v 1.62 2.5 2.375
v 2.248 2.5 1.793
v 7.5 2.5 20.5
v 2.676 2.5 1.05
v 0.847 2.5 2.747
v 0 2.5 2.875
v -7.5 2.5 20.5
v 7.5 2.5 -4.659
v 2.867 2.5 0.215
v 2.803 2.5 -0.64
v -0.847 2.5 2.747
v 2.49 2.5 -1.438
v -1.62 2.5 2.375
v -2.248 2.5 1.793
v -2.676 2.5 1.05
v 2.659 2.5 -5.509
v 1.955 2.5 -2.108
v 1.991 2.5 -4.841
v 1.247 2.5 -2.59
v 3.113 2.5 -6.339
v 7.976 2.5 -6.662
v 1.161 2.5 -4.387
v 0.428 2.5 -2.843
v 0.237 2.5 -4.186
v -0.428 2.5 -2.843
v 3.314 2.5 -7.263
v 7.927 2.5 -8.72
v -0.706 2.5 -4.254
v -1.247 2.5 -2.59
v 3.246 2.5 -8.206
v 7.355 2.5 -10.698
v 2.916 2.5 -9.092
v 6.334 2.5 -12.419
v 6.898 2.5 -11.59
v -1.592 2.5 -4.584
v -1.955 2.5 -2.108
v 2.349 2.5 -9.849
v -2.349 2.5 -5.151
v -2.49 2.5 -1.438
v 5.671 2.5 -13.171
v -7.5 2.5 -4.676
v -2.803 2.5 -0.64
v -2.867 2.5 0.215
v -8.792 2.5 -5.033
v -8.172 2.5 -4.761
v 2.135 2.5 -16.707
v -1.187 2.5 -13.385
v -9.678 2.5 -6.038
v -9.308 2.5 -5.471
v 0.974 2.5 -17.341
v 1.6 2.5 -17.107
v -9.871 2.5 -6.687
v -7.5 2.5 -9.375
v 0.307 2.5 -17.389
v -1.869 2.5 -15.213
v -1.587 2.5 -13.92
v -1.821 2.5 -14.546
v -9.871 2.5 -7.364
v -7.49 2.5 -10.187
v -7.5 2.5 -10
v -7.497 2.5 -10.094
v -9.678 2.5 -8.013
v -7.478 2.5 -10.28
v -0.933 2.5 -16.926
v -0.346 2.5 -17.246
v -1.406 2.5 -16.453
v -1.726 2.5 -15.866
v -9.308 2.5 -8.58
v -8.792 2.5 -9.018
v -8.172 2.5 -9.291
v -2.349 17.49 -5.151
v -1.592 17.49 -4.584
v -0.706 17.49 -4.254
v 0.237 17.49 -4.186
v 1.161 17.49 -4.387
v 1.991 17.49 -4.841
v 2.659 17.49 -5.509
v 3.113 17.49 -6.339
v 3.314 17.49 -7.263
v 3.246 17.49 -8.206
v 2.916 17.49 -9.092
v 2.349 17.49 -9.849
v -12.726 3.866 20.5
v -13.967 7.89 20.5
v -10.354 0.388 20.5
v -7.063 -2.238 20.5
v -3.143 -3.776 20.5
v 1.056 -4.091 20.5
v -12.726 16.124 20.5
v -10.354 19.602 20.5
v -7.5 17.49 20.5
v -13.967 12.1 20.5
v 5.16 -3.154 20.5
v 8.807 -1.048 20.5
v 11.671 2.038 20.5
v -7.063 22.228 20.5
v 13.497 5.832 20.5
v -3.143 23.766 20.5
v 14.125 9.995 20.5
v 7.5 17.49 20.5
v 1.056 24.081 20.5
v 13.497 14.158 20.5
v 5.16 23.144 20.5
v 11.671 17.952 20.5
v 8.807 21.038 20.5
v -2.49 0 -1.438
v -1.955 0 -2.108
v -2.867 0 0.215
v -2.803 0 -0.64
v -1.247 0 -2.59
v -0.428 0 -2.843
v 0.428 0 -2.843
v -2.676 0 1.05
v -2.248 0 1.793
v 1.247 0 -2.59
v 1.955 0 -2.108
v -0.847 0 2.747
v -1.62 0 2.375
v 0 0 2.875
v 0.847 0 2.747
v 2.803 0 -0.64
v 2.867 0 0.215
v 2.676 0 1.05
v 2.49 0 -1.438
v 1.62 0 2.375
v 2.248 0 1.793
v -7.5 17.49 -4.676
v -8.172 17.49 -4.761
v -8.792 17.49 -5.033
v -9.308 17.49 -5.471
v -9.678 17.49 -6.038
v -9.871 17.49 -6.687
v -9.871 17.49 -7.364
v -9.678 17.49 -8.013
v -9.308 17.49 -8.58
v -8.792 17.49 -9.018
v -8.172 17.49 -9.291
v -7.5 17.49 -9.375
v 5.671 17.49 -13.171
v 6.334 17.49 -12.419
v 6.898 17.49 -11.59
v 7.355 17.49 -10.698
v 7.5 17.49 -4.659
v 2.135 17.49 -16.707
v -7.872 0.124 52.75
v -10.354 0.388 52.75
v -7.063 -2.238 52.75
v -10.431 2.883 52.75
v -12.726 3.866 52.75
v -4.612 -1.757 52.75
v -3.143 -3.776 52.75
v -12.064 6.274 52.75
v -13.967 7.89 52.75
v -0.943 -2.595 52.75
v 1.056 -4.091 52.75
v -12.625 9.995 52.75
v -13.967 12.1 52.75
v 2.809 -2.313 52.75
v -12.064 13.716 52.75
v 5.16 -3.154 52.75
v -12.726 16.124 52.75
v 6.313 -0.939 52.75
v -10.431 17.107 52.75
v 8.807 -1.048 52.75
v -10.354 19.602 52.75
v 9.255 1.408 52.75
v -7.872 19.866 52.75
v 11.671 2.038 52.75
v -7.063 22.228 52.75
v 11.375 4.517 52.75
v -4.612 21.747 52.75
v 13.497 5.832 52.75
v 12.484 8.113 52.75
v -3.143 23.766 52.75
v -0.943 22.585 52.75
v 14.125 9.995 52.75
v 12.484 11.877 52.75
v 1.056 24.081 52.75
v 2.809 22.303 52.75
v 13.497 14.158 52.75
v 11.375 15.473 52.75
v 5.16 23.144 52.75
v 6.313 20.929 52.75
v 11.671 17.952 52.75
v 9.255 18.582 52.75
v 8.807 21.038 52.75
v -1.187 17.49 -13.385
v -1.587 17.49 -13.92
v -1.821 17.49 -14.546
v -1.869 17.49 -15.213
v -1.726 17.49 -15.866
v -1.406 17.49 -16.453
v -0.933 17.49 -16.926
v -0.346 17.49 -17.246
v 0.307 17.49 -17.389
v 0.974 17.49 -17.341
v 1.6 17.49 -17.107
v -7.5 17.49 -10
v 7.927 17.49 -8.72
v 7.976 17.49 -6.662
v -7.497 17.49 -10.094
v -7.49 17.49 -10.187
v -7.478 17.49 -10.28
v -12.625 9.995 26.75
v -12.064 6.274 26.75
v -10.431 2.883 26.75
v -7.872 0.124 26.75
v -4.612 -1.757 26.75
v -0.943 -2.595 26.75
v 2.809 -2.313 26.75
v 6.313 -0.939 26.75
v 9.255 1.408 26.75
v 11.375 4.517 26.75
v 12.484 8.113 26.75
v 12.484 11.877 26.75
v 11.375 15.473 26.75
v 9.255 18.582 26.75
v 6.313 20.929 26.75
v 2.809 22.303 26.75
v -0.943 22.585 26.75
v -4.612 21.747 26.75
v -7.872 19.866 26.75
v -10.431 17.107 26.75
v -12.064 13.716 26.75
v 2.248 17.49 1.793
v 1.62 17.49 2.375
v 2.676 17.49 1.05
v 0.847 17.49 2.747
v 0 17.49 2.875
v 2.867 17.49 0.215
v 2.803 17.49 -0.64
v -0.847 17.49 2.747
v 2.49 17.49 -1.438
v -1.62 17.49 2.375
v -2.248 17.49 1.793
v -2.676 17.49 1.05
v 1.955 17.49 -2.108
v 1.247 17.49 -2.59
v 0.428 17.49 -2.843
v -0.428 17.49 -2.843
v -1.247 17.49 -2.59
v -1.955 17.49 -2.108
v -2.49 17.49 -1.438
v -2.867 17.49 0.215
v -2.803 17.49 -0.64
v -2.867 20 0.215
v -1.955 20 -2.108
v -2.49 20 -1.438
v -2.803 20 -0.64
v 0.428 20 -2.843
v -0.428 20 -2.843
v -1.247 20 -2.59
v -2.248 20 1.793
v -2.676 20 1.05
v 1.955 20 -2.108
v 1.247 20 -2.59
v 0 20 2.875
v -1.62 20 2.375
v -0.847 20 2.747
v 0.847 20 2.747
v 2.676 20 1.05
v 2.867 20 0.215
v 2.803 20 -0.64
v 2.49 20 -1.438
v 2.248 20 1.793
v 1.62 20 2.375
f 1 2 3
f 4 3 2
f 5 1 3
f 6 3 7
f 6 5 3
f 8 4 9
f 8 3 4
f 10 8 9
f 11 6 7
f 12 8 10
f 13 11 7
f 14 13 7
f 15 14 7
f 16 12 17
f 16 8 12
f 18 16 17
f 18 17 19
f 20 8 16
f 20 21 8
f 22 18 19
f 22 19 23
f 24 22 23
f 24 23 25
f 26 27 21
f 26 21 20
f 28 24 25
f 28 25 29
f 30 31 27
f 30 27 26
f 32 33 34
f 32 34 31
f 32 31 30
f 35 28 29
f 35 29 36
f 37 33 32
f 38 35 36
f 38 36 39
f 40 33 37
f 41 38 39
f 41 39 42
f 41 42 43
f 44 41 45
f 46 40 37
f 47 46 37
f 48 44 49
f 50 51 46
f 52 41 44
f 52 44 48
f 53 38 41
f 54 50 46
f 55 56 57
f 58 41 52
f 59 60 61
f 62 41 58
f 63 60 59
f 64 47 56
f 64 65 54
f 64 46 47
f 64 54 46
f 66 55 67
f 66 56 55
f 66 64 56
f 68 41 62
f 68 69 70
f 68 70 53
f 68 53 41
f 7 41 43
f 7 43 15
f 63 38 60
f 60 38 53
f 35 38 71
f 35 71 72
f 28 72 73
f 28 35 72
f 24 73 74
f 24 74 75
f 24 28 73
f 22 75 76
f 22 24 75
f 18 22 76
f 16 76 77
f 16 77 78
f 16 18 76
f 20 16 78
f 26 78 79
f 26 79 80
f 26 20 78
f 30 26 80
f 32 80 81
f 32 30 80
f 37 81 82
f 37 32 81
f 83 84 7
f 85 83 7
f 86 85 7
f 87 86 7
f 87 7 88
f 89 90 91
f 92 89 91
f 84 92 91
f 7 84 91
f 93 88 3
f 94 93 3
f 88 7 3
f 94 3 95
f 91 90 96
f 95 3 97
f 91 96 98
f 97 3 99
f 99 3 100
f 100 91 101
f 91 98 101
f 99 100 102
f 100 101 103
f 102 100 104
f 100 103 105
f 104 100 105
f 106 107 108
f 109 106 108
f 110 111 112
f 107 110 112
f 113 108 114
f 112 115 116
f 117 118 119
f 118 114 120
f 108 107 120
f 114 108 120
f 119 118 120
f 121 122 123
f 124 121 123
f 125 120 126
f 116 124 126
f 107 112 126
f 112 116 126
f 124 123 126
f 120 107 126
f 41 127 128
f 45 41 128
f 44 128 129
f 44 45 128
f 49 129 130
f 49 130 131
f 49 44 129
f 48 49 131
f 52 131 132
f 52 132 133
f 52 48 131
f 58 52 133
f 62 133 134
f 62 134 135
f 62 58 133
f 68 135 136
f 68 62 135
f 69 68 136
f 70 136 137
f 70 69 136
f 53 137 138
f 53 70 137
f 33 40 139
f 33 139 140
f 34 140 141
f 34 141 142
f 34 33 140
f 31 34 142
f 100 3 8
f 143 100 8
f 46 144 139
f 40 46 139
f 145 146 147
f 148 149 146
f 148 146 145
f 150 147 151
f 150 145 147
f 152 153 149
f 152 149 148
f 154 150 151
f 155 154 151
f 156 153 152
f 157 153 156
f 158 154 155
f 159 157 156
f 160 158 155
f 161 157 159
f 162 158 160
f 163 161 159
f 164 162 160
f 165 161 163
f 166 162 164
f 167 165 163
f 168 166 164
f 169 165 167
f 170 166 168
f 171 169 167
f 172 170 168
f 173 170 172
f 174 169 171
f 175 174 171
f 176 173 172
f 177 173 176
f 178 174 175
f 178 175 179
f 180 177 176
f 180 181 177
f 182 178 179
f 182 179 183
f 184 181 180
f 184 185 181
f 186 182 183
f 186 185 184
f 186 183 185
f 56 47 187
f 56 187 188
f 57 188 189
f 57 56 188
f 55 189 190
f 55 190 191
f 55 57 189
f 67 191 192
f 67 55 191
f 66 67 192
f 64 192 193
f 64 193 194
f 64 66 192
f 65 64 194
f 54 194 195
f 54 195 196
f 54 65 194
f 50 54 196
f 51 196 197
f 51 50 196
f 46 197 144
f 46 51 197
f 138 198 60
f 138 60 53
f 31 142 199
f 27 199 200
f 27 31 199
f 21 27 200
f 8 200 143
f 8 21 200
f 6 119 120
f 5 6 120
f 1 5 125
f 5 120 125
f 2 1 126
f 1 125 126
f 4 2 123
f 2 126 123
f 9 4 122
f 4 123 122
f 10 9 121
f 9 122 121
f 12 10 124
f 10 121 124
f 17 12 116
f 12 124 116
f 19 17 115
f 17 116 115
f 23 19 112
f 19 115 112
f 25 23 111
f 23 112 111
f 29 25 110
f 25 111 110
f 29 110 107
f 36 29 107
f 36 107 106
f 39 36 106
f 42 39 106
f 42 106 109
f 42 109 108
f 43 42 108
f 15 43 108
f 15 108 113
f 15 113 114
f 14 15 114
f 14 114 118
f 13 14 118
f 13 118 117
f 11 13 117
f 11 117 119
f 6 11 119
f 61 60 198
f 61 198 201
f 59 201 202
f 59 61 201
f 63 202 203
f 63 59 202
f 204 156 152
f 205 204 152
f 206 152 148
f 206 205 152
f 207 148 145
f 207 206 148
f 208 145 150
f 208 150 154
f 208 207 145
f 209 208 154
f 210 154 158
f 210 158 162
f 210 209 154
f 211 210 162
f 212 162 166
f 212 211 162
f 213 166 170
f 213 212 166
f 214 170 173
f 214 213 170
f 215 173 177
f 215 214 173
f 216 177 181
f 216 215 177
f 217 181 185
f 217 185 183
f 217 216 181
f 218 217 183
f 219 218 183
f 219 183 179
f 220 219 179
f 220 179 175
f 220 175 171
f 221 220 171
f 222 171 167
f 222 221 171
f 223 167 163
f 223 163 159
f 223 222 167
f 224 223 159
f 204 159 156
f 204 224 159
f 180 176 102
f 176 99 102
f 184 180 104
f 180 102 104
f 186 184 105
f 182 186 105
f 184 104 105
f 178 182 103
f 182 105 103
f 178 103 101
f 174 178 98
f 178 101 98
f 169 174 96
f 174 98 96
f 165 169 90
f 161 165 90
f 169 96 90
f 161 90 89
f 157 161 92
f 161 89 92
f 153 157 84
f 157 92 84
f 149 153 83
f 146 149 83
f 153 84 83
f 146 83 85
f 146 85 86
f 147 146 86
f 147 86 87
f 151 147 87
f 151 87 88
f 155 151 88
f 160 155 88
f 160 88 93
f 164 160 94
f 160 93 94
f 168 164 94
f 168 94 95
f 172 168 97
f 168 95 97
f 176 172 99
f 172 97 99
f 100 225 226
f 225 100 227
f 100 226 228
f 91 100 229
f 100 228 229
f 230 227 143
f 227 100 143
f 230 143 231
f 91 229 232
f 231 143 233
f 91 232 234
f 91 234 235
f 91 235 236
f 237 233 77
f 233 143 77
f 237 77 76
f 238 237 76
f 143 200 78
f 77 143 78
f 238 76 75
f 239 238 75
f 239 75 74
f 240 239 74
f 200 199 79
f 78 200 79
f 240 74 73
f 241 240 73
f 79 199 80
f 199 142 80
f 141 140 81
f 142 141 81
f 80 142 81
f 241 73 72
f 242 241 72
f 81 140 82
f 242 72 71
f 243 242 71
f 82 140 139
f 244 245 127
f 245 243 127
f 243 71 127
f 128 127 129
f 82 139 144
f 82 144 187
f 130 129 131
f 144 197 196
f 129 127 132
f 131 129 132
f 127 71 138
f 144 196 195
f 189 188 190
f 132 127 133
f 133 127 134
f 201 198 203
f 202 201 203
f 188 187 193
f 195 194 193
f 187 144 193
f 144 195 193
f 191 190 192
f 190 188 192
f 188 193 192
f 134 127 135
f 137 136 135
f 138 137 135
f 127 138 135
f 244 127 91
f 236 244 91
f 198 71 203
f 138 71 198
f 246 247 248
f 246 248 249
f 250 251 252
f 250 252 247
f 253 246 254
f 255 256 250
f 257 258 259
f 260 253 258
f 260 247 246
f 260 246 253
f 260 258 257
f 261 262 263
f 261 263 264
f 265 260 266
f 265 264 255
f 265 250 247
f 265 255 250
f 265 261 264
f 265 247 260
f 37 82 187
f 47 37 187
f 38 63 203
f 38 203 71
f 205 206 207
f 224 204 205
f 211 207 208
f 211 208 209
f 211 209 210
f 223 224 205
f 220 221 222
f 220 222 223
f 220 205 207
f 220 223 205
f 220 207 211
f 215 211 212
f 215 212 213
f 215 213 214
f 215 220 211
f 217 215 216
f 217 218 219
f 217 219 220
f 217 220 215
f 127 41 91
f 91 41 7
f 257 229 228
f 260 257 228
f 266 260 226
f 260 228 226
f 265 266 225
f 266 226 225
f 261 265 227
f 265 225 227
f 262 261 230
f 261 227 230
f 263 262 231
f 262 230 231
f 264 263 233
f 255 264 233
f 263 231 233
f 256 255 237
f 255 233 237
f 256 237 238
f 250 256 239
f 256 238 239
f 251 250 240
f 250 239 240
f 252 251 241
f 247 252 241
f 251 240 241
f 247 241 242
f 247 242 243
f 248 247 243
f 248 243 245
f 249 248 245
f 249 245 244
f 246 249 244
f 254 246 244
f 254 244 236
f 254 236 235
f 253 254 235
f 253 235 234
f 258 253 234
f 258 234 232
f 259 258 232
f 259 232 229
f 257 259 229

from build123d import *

# Parameters (mm, degrees)
SKETCH1_R           = 2.875
BOSS_EXTRUDE1_DEPTH = 20
SKETCH2_R           = 2.875
BOSS_EXTRUDE2_DEPTH = 14.99
BOSS_EXTRUDE3_DEPTH = 14.99
SKETCH4_R           = 14.125
SKETCH4_W           = 15
SKETCH4_H           = 14.99
SKETCH4_H_2         = 7.495
BOSS_EXTRUDE4_DEPTH = 6.25
SKETCH5_R           = 14.125
SKETCH5_R_2         = 12.625
BOSS_EXTRUDE5_DEPTH = 26
BOSS_EXTRUDE8_DEPTH = 14.99
CUT_EXTRUDE3_DEPTH  = 59.732465681


with BuildPart() as part:
    # Sketch1 → Boss-Extrude1 (new body)
    with BuildSketch(Plane(origin=(0, 0, 0), x_dir=(1, 0, 0), z_dir=(0, 1, 0))):
        with Locations(Location((0, 0, 0), (0, 0, 270))):
            Circle(SKETCH1_R)
    extrude(amount=BOSS_EXTRUDE1_DEPTH)

    # Sketch2 → Boss-Extrude2 (add)
    with BuildSketch(Plane(origin=(0, 2.5, 0), x_dir=(-1, 0, 0), z_dir=(0, -1, 0))):
        with BuildLine():
            Line((-4, 7.5), (-4, 10))
            ThreePointArc((-4, 10), (-5.75, 11.75), (-7.5, 10))
            Line((-7.5, 10), (-7.5, 0))
            ThreePointArc((-7.5, 0), (0, -7.5), (7.5, 0))
            Line((7.5, 0), (7.5, 10))
            ThreePointArc((7.5, 10), (5.75, 11.75), (4, 10))
            Line((4, 10), (4, 7.5))
            ThreePointArc((4, 7.5), (0, 3.5), (-4, 7.5))
        make_face()
        with Locations(Location((0, 0, 0), (0, 0, 90))):
            Circle(SKETCH2_R, mode=Mode.SUBTRACT)
    extrude(amount=-BOSS_EXTRUDE2_DEPTH)

    # Sketch3 → Boss-Extrude3 (add)
    with BuildSketch(Plane(origin=(0, 2.5, 0), x_dir=(-1, 0, 0), z_dir=(0, -1, 0))):
        with BuildLine():
            Line((7.5, 0), (7.5, -20.5))
            Line((7.5, -20.5), (-7.5, -20.5))
            Line((-7.5, -20.5), (-7.5, 0))
            ThreePointArc((-7.5, 0), (0, -7.5), (7.5, 0))
        make_face()
    extrude(amount=-BOSS_EXTRUDE3_DEPTH)

    # Sketch4 → Boss-Extrude4 (add)
    # profile 1 of 3: a face of its own
    with BuildSketch(Plane.XY.offset(20.5)):
        with Locations((0, 9.995)):
            Circle(SKETCH4_R)
        with Locations((0, 9.995)):
            Rectangle(SKETCH4_W, SKETCH4_H, mode=Mode.SUBTRACT)
    # profile 2 of 3: a face of its own
    with BuildSketch(Plane.XY.offset(20.5)):
        with Locations((0, 13.7425)):
            Rectangle(SKETCH4_W, SKETCH4_H_2)
    # profile 3 of 3: a face of its own
    with BuildSketch(Plane.XY.offset(20.5)):
        with Locations((0, 6.2475)):
            Rectangle(SKETCH4_W, SKETCH4_H_2)
    extrude(amount=BOSS_EXTRUDE4_DEPTH)

    # Sketch5 → Boss-Extrude5 (add)
    with BuildSketch(Plane.XY.offset(26.75)):
        with Locations((0, 9.995)):
            Circle(SKETCH5_R)
        with Locations(Location((0, 9.995, 0), (0, 0, 180))):
            Circle(SKETCH5_R_2, mode=Mode.SUBTRACT)
    extrude(amount=BOSS_EXTRUDE5_DEPTH)

    # Sketch6 → Boss-Extrude8 (add)
    with BuildSketch(Plane(origin=(0, 2.5, 0), x_dir=(-1, 0, 0), z_dir=(0, -1, 0))):
        with BuildLine():
            Line((-2.135439924, 16.706507736), (-5.67097383, 13.17097383))
            ThreePointArc((-5.67097383, 13.17097383), (-6.629279887, 12.013594636), (-7.354872555, 10.697770796))
            ThreePointArc((-7.354872555, 10.697770796), (-5.393648327, 11.713334026), (-4, 10))
            Line((-4, 10), (-4, 7.5))
            ThreePointArc((-4, 7.5), (-0.388580969, 3.518919138), (3.924502415, 6.726513871))
            Line((3.924502415, 6.726513871), (2.348994272, 5.151005728))
            ThreePointArc((2.348994272, 5.151005728), (-2.348994272, 5.151005728), (-2.348994272, 9.848994272))
            Line((-2.348994272, 9.848994272), (1.186539634, 13.384528178))
            ThreePointArc((1.186539634, 13.384528178), (1.186539634, 16.706507736), (-2.135439924, 16.706507736))
        make_face()
        with BuildLine():
            ThreePointArc((-7.5, 10), (-7.463334026, 10.356351673), (-7.354872555, 10.697770796))
            ThreePointArc((-7.354872555, 10.697770796), (-8.017652884, 7.692692975), (-7.5, 4.659245108))
            Line((-7.5, 4.659245108), (-7.5, 10))
        make_face()
        with BuildLine():
            Line((7.5, 9.375108987), (7.5, 4.675990723))
            ThreePointArc((7.5, 4.675990723), (9.895517957, 7.025549855), (7.5, 9.375108987))
        make_face()
    extrude(amount=-BOSS_EXTRUDE8_DEPTH)

    # Sketch7 → Cut-Extrude3 (cut, through all)
    with BuildSketch(Plane(origin=(0, 2.5, 0), x_dir=(-1, 0, 0), z_dir=(0, -1, 0))):
        Polygon((3.924502415, 6.726513871), (1.023758885, 9.627257401), (6.777821546, 15.381320062), (9.647679203, 12.449690659), align=None)
    extrude(amount=-CUT_EXTRUDE3_DEPTH, mode=Mode.SUBTRACT)


solid = part.part
